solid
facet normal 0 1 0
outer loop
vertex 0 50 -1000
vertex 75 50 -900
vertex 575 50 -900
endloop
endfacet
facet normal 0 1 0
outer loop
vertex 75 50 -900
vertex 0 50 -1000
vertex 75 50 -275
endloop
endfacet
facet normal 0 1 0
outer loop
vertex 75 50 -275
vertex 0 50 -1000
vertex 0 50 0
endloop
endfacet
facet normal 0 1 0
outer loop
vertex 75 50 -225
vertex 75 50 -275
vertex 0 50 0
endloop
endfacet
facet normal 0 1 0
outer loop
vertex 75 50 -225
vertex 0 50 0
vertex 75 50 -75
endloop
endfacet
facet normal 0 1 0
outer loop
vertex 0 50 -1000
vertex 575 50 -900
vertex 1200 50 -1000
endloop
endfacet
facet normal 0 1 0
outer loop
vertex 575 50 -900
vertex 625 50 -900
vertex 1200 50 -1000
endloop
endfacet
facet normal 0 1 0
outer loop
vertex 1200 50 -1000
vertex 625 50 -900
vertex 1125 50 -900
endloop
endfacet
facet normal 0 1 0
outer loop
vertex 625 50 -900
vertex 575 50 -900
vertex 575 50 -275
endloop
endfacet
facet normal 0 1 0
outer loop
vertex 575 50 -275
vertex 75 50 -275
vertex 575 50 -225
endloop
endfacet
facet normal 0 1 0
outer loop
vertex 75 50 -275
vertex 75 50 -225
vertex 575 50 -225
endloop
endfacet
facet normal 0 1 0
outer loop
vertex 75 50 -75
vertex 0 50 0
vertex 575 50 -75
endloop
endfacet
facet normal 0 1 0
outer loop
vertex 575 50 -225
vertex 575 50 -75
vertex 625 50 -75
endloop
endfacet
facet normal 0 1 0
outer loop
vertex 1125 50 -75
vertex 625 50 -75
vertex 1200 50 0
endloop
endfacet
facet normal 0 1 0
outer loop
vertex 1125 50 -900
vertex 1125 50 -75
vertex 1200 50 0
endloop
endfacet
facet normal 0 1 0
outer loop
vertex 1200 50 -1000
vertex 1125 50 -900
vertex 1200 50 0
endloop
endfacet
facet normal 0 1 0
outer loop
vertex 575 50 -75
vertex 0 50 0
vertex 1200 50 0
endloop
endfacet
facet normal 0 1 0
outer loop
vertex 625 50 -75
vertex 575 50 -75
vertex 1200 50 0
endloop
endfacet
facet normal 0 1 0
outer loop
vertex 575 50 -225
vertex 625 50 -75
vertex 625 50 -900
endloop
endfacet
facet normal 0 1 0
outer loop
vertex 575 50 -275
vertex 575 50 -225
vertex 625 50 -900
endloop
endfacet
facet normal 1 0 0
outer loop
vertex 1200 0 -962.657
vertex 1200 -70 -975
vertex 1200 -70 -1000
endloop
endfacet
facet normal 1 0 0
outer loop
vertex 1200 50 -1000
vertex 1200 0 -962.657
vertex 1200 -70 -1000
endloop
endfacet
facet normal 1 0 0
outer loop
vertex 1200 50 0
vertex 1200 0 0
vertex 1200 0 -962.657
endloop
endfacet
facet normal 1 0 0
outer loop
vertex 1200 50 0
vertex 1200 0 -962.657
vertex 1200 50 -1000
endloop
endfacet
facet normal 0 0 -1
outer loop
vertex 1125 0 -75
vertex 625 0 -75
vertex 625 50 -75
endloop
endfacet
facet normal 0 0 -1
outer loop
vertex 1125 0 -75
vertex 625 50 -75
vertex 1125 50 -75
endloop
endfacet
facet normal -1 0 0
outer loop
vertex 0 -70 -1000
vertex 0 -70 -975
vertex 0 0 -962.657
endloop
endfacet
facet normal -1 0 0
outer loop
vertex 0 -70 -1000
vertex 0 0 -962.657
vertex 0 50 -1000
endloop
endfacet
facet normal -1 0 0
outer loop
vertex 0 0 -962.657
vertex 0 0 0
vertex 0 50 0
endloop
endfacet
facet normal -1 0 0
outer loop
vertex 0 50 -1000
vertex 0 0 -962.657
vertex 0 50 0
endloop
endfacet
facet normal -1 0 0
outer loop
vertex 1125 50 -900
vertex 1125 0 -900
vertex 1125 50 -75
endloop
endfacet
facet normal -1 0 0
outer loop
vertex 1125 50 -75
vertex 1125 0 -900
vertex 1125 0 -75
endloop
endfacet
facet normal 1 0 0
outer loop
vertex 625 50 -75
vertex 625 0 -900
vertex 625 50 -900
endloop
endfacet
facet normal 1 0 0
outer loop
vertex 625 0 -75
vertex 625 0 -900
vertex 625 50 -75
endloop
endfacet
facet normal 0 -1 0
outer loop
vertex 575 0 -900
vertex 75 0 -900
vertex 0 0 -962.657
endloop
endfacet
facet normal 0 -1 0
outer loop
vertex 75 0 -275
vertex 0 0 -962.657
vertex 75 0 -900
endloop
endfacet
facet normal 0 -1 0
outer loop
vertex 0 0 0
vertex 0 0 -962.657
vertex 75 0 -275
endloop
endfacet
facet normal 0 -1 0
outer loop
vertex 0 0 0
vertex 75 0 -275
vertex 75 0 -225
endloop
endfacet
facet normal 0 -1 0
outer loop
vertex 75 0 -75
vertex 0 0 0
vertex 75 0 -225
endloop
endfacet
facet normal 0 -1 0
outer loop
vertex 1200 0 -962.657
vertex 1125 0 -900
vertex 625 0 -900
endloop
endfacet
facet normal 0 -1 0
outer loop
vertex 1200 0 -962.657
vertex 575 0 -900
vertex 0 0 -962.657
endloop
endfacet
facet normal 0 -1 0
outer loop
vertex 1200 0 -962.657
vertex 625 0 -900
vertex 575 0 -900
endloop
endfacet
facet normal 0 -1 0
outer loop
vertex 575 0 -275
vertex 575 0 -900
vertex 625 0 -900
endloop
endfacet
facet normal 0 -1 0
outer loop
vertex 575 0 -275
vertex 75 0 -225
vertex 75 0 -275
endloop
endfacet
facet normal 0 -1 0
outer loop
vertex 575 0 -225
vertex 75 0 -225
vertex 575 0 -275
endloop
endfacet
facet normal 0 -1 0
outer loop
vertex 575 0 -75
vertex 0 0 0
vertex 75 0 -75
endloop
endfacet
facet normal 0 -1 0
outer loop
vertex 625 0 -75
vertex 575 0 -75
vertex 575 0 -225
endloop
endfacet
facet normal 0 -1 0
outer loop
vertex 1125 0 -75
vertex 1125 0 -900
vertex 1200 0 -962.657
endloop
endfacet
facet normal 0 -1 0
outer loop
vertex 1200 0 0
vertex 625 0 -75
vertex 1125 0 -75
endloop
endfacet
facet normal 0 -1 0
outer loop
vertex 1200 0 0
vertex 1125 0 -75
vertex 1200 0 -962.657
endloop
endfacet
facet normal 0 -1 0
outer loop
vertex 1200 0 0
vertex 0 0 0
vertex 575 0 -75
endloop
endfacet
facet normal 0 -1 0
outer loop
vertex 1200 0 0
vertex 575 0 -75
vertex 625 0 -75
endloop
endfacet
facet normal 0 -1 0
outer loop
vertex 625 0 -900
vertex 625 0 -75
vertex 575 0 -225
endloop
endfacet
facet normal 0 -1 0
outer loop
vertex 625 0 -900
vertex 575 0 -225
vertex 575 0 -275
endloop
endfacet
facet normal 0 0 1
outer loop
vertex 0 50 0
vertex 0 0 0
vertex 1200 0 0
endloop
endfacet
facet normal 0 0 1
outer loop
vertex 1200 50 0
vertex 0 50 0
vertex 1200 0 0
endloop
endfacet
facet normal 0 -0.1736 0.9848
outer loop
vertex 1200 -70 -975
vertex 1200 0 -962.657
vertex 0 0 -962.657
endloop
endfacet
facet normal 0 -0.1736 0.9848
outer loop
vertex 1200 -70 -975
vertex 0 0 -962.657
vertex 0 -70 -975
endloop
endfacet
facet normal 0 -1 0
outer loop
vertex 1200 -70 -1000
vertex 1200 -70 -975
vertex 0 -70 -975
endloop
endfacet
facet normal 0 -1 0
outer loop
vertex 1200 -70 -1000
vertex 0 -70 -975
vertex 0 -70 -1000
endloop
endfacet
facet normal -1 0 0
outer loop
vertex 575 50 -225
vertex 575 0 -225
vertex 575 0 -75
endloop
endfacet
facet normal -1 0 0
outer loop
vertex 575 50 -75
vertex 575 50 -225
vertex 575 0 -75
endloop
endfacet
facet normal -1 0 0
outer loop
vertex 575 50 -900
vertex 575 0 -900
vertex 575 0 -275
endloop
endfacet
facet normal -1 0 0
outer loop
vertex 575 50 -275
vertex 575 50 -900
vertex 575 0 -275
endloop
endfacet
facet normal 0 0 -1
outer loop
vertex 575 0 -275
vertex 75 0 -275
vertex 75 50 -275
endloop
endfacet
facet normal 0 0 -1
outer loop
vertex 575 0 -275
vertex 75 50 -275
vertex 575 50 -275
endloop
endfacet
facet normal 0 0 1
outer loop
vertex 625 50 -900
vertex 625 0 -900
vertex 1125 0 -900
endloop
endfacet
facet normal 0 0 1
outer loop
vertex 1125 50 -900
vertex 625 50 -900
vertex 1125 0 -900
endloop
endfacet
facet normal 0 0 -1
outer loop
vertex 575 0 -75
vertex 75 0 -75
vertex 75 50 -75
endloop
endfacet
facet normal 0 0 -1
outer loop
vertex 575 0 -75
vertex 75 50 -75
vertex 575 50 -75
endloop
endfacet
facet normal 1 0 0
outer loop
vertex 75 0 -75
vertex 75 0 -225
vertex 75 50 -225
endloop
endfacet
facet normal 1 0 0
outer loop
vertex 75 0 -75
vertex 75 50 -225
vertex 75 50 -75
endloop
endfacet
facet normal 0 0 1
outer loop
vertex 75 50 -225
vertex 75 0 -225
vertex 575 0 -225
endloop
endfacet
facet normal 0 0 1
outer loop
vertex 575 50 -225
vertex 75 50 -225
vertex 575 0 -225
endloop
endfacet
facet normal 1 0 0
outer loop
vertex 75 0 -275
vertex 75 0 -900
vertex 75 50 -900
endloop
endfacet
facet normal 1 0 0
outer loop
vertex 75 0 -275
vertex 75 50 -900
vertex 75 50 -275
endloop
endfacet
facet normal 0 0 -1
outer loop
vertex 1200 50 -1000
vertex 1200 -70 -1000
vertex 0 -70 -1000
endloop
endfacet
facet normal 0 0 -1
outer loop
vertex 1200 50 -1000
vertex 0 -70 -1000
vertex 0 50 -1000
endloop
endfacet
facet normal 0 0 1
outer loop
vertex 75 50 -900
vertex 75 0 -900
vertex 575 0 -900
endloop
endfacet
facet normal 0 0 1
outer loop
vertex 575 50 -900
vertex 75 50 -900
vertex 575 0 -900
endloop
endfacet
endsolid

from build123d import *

# Parameters (mm, degrees)
F0_W     = 1200
F0_H     = 1000
F0_W_2   = 500
F0_H_2   = 625
F0_H_3   = 150
F0_H_4   = 825
F1_DEPTH = 50
F3_DEPTH = 1200


with BuildPart() as f1:
    # F0 (on Front) → F1 (new body)
    with BuildSketch(Plane.XZ):
        with Locations((600, -500)):
            Rectangle(F0_W, F0_H)
        with Locations((325, -587.5)):
            Rectangle(F0_W_2, F0_H_2, mode=Mode.SUBTRACT)
        with Locations((325, -150)):
            Rectangle(F0_W_2, F0_H_3, mode=Mode.SUBTRACT)
        with Locations((875, -487.5)):
            Rectangle(F0_W_2, F0_H_4, mode=Mode.SUBTRACT)
    extrude(amount=-F1_DEPTH)

    # F2 (on face) → F3 (join)
    with BuildSketch(Plane.YZ.offset(1200)):
        Polygon((-70, -1000), (0, -1000), (0, -962.657111), (-70, -975), align=None)
    extrude(amount=-F3_DEPTH)


solid = f1.part
